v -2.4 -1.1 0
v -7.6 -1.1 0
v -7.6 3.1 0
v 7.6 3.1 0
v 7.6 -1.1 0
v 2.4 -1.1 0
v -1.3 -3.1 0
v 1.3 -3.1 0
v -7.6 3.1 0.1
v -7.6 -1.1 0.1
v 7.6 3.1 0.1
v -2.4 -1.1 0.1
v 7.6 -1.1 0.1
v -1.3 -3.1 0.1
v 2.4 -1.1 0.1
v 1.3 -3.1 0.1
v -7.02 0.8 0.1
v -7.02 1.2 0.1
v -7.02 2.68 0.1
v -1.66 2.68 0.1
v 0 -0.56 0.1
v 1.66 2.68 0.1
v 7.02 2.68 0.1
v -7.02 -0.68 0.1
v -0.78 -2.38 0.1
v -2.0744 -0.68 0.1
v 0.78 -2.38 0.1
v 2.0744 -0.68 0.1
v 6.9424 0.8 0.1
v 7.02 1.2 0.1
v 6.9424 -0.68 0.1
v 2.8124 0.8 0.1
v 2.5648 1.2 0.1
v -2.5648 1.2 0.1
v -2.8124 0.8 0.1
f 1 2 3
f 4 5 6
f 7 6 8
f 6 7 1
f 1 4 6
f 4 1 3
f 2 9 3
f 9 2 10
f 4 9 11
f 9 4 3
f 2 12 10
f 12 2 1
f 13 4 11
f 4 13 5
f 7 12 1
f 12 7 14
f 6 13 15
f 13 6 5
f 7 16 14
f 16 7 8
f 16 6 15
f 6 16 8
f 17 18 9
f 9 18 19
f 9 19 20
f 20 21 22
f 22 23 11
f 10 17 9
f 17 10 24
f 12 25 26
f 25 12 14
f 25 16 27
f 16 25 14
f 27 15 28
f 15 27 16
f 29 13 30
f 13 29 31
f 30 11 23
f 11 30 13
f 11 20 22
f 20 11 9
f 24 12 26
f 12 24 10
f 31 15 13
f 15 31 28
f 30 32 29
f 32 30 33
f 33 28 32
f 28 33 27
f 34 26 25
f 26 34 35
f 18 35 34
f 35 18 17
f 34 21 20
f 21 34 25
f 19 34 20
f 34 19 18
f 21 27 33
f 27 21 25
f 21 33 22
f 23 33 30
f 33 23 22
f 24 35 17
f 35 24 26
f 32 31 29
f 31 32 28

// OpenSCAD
use <../lib.scad>
function ldraw_lib__169635a() = [
// 0 Sticker  0.8 x  1.9 with Blue V and Red Lines on Transparent Background
// 0 Name: 169635a.dat
// 0 Author: Chris Böhnke [KnightOfTarenta]
// 0 !LDRAW_ORG Part UPDATE 2025-04
// 0 !LICENSE Licensed under CC BY 4.0 : see CAreadme.txt
// 
// 0 BFC CERTIFY CCW
  [0,"BFC","CERTIFY"],
  [0,"BFC","CCW"],
// 
// 0 !KEYWORDS Bricklink 6614stk01, Launch Command, Launch Evac 1
// 0 !KEYWORDS Rebrickable 169635, Set 6614, space port, town
// 
// 0 !HISTORY 2025-04-27 [OrionP] Official Update 2025-04
// 
// 0 // Sticker Back
// 3 16 -6 0 -2.75 -19 0 -2.75 -19 0 7.75
  [3,16,-6,0,-2.75,-19,0,-2.75,-19,0,7.75],
// 3 16 19 0 7.75 19 0 -2.75 6 0 -2.75
  [3,16,19,0,7.75,19,0,-2.75,6,0,-2.75],
// 4 16 3.25 0 -7.75 -3.25 0 -7.75 -6 0 -2.75 6 0 -2.75
  [4,16,3.25,0,-7.75,-3.25,0,-7.75,-6,0,-2.75,6,0,-2.75],
// 4 16 -6 0 -2.75 -19 0 7.75 19 0 7.75 6 0 -2.75
  [4,16,-6,0,-2.75,-19,0,7.75,19,0,7.75,6,0,-2.75],
// 
// 0 // Sticker Borders
// 4 16 -19 -.25 7.75 -19 0 7.75 -19 0 -2.75 -19 -.25 -2.75
  [4,16,-19,-.25,7.75,-19,0,7.75,-19,0,-2.75,-19,-.25,-2.75],
// 4 16 -19 0 7.75 -19 -.25 7.75 19 -.25 7.75 19 0 7.75
  [4,16,-19,0,7.75,-19,-.25,7.75,19,-.25,7.75,19,0,7.75],
// 4 16 -6 0 -2.75 -6 -.25 -2.75 -19 -.25 -2.75 -19 0 -2.75
  [4,16,-6,0,-2.75,-6,-.25,-2.75,-19,-.25,-2.75,-19,0,-2.75],
// 4 16 19 0 7.75 19 -.25 7.75 19 -.25 -2.75 19 0 -2.75
  [4,16,19,0,7.75,19,-.25,7.75,19,-.25,-2.75,19,0,-2.75],
// 4 16 -6 -.25 -2.75 -6 0 -2.75 -3.25 0 -7.75 -3.25 -.25 -7.75
  [4,16,-6,-.25,-2.75,-6,0,-2.75,-3.25,0,-7.75,-3.25,-.25,-7.75],
// 4 16 19 0 -2.75 19 -.25 -2.75 6 -.25 -2.75 6 0 -2.75
  [4,16,19,0,-2.75,19,-.25,-2.75,6,-.25,-2.75,6,0,-2.75],
// 4 16 -3.25 -.25 -7.75 -3.25 0 -7.75 3.25 0 -7.75 3.25 -.25 -7.75
  [4,16,-3.25,-.25,-7.75,-3.25,0,-7.75,3.25,0,-7.75,3.25,-.25,-7.75],
// 4 16 6 0 -2.75 6 -.25 -2.75 3.25 -.25 -7.75 3.25 0 -7.75
  [4,16,6,0,-2.75,6,-.25,-2.75,3.25,-.25,-7.75,3.25,0,-7.75],
// 
// 0 // Pattern
// 0 // Colour 16 Main Colour
// 3 16 -17.55 -.25 2 -17.55 -.25 3 -19 -.25 7.75
  [3,16,-17.55,-.25,2,-17.55,-.25,3,-19,-.25,7.75],
// 3 16 -19 -.25 7.75 -17.55 -.25 3 -17.55 -.25 6.7
  [3,16,-19,-.25,7.75,-17.55,-.25,3,-17.55,-.25,6.7],
// 3 16 -19 -.25 7.75 -17.55 -.25 6.7 -4.15 -.25 6.7
  [3,16,-19,-.25,7.75,-17.55,-.25,6.7,-4.15,-.25,6.7],
// 3 16 -4.15 -.25 6.7 0 -.25 -1.4 4.15 -.25 6.7
  [3,16,-4.15,-.25,6.7,0,-.25,-1.4,4.15,-.25,6.7],
// 3 16 4.15 -.25 6.7 17.55 -.25 6.7 19 -.25 7.75
  [3,16,4.15,-.25,6.7,17.55,-.25,6.7,19,-.25,7.75],
// 4 16 -19 -.25 7.75 -19 -.25 -2.75 -17.55 -.25 -1.7 -17.55 -.25 2
  [4,16,-19,-.25,7.75,-19,-.25,-2.75,-17.55,-.25,-1.7,-17.55,-.25,2],
// 4 16 -5.186 -.25 -1.7 -6 -.25 -2.75 -3.25 -.25 -7.75 -1.95 -.25 -5.95
  [4,16,-5.186,-.25,-1.7,-6,-.25,-2.75,-3.25,-.25,-7.75,-1.95,-.25,-5.95],
// 4 16 3.25 -.25 -7.75 1.95 -.25 -5.95 -1.95 -.25 -5.95 -3.25 -.25 -7.75
  [4,16,3.25,-.25,-7.75,1.95,-.25,-5.95,-1.95,-.25,-5.95,-3.25,-.25,-7.75],
// 4 16 3.25 -.25 -7.75 6 -.25 -2.75 5.186 -.25 -1.7 1.95 -.25 -5.95
  [4,16,3.25,-.25,-7.75,6,-.25,-2.75,5.186,-.25,-1.7,1.95,-.25,-5.95],
// 4 16 17.55 -.25 3 17.356 -.25 2 17.356 -.25 -1.7 19 -.25 -2.75
  [4,16,17.55,-.25,3,17.356,-.25,2,17.356,-.25,-1.7,19,-.25,-2.75],
// 4 16 17.55 -.25 6.7 17.55 -.25 3 19 -.25 -2.75 19 -.25 7.75
  [4,16,17.55,-.25,6.7,17.55,-.25,3,19,-.25,-2.75,19,-.25,7.75],
// 4 16 -19 -.25 7.75 -4.15 -.25 6.7 4.15 -.25 6.7 19 -.25 7.75
  [4,16,-19,-.25,7.75,-4.15,-.25,6.7,4.15,-.25,6.7,19,-.25,7.75],
// 4 16 -19 -.25 -2.75 -6 -.25 -2.75 -5.186 -.25 -1.7 -17.55 -.25 -1.7
  [4,16,-19,-.25,-2.75,-6,-.25,-2.75,-5.186,-.25,-1.7,-17.55,-.25,-1.7],
// 4 16 19 -.25 -2.75 17.356 -.25 -1.7 5.186 -.25 -1.7 6 -.25 -2.75
  [4,16,19,-.25,-2.75,17.356,-.25,-1.7,5.186,-.25,-1.7,6,-.25,-2.75],
// 4 16 17.356 -.25 2 17.55 -.25 3 6.412 -.25 3 7.031 -.25 2
  [4,16,17.356,-.25,2,17.55,-.25,3,6.412,-.25,3,7.031,-.25,2],
// 4 16 7.031 -.25 2 6.412 -.25 3 1.95 -.25 -5.95 5.186 -.25 -1.7
  [4,16,7.031,-.25,2,6.412,-.25,3,1.95,-.25,-5.95,5.186,-.25,-1.7],
// 4 16 -7.031 -.25 2 -5.186 -.25 -1.7 -1.95 -.25 -5.95 -6.412 -.25 3
  [4,16,-7.031,-.25,2,-5.186,-.25,-1.7,-1.95,-.25,-5.95,-6.412,-.25,3],
// 4 16 -17.55 -.25 2 -7.031 -.25 2 -6.412 -.25 3 -17.55 -.25 3
  [4,16,-17.55,-.25,2,-7.031,-.25,2,-6.412,-.25,3,-17.55,-.25,3],
// 
// 0 BFC NOCLIP
  [0,"BFC","NOCLIP"],
// 0 // Colour 1 Blue
// 4 1 -1.95 -.25 -5.95 0 -.25 -1.4 -4.15 -.25 6.7 -6.412 -.25 3
  [4,1,-1.95,-.25,-5.95,0,-.25,-1.4,-4.15,-.25,6.7,-6.412,-.25,3],
// 4 1 -17.55 -.25 3 -6.412 -.25 3 -4.15 -.25 6.7 -17.55 -.25 6.7
  [4,1,-17.55,-.25,3,-6.412,-.25,3,-4.15,-.25,6.7,-17.55,-.25,6.7],
// 4 1 -1.95 -.25 -5.95 1.95 -.25 -5.95 6.412 -.25 3 0 -.25 -1.4
  [4,1,-1.95,-.25,-5.95,1.95,-.25,-5.95,6.412,-.25,3,0,-.25,-1.4],
// 3 1 0 -.25 -1.4 6.412 -.25 3 4.15 -.25 6.7
  [3,1,0,-.25,-1.4,6.412,-.25,3,4.15,-.25,6.7],
// 4 1 17.55 -.25 3 17.55 -.25 6.7 4.15 -.25 6.7 6.412 -.25 3
  [4,1,17.55,-.25,3,17.55,-.25,6.7,4.15,-.25,6.7,6.412,-.25,3],
// 
// 0 // Colour 4 Red
// 4 4 -5.186 -.25 -1.7 -7.031 -.25 2 -17.55 -.25 2 -17.55 -.25 -1.7
  [4,4,-5.186,-.25,-1.7,-7.031,-.25,2,-17.55,-.25,2,-17.55,-.25,-1.7],
// 4 4 5.186 -.25 -1.7 17.356 -.25 -1.7 17.356 -.25 2 7.031 -.25 2
  [4,4,5.186,-.25,-1.7,17.356,-.25,-1.7,17.356,-.25,2,7.031,-.25,2],
];
module ldraw_lib__169635a(step=0, col=false, unit=2/5, alt=false, line=0.2, solid=!$preview)
    makepoly(ldraw_lib__169635a(), step=step, col=col, unit=unit, alt=alt, line=line, solid=solid);
ldraw_lib__169635a(line=0.2);
